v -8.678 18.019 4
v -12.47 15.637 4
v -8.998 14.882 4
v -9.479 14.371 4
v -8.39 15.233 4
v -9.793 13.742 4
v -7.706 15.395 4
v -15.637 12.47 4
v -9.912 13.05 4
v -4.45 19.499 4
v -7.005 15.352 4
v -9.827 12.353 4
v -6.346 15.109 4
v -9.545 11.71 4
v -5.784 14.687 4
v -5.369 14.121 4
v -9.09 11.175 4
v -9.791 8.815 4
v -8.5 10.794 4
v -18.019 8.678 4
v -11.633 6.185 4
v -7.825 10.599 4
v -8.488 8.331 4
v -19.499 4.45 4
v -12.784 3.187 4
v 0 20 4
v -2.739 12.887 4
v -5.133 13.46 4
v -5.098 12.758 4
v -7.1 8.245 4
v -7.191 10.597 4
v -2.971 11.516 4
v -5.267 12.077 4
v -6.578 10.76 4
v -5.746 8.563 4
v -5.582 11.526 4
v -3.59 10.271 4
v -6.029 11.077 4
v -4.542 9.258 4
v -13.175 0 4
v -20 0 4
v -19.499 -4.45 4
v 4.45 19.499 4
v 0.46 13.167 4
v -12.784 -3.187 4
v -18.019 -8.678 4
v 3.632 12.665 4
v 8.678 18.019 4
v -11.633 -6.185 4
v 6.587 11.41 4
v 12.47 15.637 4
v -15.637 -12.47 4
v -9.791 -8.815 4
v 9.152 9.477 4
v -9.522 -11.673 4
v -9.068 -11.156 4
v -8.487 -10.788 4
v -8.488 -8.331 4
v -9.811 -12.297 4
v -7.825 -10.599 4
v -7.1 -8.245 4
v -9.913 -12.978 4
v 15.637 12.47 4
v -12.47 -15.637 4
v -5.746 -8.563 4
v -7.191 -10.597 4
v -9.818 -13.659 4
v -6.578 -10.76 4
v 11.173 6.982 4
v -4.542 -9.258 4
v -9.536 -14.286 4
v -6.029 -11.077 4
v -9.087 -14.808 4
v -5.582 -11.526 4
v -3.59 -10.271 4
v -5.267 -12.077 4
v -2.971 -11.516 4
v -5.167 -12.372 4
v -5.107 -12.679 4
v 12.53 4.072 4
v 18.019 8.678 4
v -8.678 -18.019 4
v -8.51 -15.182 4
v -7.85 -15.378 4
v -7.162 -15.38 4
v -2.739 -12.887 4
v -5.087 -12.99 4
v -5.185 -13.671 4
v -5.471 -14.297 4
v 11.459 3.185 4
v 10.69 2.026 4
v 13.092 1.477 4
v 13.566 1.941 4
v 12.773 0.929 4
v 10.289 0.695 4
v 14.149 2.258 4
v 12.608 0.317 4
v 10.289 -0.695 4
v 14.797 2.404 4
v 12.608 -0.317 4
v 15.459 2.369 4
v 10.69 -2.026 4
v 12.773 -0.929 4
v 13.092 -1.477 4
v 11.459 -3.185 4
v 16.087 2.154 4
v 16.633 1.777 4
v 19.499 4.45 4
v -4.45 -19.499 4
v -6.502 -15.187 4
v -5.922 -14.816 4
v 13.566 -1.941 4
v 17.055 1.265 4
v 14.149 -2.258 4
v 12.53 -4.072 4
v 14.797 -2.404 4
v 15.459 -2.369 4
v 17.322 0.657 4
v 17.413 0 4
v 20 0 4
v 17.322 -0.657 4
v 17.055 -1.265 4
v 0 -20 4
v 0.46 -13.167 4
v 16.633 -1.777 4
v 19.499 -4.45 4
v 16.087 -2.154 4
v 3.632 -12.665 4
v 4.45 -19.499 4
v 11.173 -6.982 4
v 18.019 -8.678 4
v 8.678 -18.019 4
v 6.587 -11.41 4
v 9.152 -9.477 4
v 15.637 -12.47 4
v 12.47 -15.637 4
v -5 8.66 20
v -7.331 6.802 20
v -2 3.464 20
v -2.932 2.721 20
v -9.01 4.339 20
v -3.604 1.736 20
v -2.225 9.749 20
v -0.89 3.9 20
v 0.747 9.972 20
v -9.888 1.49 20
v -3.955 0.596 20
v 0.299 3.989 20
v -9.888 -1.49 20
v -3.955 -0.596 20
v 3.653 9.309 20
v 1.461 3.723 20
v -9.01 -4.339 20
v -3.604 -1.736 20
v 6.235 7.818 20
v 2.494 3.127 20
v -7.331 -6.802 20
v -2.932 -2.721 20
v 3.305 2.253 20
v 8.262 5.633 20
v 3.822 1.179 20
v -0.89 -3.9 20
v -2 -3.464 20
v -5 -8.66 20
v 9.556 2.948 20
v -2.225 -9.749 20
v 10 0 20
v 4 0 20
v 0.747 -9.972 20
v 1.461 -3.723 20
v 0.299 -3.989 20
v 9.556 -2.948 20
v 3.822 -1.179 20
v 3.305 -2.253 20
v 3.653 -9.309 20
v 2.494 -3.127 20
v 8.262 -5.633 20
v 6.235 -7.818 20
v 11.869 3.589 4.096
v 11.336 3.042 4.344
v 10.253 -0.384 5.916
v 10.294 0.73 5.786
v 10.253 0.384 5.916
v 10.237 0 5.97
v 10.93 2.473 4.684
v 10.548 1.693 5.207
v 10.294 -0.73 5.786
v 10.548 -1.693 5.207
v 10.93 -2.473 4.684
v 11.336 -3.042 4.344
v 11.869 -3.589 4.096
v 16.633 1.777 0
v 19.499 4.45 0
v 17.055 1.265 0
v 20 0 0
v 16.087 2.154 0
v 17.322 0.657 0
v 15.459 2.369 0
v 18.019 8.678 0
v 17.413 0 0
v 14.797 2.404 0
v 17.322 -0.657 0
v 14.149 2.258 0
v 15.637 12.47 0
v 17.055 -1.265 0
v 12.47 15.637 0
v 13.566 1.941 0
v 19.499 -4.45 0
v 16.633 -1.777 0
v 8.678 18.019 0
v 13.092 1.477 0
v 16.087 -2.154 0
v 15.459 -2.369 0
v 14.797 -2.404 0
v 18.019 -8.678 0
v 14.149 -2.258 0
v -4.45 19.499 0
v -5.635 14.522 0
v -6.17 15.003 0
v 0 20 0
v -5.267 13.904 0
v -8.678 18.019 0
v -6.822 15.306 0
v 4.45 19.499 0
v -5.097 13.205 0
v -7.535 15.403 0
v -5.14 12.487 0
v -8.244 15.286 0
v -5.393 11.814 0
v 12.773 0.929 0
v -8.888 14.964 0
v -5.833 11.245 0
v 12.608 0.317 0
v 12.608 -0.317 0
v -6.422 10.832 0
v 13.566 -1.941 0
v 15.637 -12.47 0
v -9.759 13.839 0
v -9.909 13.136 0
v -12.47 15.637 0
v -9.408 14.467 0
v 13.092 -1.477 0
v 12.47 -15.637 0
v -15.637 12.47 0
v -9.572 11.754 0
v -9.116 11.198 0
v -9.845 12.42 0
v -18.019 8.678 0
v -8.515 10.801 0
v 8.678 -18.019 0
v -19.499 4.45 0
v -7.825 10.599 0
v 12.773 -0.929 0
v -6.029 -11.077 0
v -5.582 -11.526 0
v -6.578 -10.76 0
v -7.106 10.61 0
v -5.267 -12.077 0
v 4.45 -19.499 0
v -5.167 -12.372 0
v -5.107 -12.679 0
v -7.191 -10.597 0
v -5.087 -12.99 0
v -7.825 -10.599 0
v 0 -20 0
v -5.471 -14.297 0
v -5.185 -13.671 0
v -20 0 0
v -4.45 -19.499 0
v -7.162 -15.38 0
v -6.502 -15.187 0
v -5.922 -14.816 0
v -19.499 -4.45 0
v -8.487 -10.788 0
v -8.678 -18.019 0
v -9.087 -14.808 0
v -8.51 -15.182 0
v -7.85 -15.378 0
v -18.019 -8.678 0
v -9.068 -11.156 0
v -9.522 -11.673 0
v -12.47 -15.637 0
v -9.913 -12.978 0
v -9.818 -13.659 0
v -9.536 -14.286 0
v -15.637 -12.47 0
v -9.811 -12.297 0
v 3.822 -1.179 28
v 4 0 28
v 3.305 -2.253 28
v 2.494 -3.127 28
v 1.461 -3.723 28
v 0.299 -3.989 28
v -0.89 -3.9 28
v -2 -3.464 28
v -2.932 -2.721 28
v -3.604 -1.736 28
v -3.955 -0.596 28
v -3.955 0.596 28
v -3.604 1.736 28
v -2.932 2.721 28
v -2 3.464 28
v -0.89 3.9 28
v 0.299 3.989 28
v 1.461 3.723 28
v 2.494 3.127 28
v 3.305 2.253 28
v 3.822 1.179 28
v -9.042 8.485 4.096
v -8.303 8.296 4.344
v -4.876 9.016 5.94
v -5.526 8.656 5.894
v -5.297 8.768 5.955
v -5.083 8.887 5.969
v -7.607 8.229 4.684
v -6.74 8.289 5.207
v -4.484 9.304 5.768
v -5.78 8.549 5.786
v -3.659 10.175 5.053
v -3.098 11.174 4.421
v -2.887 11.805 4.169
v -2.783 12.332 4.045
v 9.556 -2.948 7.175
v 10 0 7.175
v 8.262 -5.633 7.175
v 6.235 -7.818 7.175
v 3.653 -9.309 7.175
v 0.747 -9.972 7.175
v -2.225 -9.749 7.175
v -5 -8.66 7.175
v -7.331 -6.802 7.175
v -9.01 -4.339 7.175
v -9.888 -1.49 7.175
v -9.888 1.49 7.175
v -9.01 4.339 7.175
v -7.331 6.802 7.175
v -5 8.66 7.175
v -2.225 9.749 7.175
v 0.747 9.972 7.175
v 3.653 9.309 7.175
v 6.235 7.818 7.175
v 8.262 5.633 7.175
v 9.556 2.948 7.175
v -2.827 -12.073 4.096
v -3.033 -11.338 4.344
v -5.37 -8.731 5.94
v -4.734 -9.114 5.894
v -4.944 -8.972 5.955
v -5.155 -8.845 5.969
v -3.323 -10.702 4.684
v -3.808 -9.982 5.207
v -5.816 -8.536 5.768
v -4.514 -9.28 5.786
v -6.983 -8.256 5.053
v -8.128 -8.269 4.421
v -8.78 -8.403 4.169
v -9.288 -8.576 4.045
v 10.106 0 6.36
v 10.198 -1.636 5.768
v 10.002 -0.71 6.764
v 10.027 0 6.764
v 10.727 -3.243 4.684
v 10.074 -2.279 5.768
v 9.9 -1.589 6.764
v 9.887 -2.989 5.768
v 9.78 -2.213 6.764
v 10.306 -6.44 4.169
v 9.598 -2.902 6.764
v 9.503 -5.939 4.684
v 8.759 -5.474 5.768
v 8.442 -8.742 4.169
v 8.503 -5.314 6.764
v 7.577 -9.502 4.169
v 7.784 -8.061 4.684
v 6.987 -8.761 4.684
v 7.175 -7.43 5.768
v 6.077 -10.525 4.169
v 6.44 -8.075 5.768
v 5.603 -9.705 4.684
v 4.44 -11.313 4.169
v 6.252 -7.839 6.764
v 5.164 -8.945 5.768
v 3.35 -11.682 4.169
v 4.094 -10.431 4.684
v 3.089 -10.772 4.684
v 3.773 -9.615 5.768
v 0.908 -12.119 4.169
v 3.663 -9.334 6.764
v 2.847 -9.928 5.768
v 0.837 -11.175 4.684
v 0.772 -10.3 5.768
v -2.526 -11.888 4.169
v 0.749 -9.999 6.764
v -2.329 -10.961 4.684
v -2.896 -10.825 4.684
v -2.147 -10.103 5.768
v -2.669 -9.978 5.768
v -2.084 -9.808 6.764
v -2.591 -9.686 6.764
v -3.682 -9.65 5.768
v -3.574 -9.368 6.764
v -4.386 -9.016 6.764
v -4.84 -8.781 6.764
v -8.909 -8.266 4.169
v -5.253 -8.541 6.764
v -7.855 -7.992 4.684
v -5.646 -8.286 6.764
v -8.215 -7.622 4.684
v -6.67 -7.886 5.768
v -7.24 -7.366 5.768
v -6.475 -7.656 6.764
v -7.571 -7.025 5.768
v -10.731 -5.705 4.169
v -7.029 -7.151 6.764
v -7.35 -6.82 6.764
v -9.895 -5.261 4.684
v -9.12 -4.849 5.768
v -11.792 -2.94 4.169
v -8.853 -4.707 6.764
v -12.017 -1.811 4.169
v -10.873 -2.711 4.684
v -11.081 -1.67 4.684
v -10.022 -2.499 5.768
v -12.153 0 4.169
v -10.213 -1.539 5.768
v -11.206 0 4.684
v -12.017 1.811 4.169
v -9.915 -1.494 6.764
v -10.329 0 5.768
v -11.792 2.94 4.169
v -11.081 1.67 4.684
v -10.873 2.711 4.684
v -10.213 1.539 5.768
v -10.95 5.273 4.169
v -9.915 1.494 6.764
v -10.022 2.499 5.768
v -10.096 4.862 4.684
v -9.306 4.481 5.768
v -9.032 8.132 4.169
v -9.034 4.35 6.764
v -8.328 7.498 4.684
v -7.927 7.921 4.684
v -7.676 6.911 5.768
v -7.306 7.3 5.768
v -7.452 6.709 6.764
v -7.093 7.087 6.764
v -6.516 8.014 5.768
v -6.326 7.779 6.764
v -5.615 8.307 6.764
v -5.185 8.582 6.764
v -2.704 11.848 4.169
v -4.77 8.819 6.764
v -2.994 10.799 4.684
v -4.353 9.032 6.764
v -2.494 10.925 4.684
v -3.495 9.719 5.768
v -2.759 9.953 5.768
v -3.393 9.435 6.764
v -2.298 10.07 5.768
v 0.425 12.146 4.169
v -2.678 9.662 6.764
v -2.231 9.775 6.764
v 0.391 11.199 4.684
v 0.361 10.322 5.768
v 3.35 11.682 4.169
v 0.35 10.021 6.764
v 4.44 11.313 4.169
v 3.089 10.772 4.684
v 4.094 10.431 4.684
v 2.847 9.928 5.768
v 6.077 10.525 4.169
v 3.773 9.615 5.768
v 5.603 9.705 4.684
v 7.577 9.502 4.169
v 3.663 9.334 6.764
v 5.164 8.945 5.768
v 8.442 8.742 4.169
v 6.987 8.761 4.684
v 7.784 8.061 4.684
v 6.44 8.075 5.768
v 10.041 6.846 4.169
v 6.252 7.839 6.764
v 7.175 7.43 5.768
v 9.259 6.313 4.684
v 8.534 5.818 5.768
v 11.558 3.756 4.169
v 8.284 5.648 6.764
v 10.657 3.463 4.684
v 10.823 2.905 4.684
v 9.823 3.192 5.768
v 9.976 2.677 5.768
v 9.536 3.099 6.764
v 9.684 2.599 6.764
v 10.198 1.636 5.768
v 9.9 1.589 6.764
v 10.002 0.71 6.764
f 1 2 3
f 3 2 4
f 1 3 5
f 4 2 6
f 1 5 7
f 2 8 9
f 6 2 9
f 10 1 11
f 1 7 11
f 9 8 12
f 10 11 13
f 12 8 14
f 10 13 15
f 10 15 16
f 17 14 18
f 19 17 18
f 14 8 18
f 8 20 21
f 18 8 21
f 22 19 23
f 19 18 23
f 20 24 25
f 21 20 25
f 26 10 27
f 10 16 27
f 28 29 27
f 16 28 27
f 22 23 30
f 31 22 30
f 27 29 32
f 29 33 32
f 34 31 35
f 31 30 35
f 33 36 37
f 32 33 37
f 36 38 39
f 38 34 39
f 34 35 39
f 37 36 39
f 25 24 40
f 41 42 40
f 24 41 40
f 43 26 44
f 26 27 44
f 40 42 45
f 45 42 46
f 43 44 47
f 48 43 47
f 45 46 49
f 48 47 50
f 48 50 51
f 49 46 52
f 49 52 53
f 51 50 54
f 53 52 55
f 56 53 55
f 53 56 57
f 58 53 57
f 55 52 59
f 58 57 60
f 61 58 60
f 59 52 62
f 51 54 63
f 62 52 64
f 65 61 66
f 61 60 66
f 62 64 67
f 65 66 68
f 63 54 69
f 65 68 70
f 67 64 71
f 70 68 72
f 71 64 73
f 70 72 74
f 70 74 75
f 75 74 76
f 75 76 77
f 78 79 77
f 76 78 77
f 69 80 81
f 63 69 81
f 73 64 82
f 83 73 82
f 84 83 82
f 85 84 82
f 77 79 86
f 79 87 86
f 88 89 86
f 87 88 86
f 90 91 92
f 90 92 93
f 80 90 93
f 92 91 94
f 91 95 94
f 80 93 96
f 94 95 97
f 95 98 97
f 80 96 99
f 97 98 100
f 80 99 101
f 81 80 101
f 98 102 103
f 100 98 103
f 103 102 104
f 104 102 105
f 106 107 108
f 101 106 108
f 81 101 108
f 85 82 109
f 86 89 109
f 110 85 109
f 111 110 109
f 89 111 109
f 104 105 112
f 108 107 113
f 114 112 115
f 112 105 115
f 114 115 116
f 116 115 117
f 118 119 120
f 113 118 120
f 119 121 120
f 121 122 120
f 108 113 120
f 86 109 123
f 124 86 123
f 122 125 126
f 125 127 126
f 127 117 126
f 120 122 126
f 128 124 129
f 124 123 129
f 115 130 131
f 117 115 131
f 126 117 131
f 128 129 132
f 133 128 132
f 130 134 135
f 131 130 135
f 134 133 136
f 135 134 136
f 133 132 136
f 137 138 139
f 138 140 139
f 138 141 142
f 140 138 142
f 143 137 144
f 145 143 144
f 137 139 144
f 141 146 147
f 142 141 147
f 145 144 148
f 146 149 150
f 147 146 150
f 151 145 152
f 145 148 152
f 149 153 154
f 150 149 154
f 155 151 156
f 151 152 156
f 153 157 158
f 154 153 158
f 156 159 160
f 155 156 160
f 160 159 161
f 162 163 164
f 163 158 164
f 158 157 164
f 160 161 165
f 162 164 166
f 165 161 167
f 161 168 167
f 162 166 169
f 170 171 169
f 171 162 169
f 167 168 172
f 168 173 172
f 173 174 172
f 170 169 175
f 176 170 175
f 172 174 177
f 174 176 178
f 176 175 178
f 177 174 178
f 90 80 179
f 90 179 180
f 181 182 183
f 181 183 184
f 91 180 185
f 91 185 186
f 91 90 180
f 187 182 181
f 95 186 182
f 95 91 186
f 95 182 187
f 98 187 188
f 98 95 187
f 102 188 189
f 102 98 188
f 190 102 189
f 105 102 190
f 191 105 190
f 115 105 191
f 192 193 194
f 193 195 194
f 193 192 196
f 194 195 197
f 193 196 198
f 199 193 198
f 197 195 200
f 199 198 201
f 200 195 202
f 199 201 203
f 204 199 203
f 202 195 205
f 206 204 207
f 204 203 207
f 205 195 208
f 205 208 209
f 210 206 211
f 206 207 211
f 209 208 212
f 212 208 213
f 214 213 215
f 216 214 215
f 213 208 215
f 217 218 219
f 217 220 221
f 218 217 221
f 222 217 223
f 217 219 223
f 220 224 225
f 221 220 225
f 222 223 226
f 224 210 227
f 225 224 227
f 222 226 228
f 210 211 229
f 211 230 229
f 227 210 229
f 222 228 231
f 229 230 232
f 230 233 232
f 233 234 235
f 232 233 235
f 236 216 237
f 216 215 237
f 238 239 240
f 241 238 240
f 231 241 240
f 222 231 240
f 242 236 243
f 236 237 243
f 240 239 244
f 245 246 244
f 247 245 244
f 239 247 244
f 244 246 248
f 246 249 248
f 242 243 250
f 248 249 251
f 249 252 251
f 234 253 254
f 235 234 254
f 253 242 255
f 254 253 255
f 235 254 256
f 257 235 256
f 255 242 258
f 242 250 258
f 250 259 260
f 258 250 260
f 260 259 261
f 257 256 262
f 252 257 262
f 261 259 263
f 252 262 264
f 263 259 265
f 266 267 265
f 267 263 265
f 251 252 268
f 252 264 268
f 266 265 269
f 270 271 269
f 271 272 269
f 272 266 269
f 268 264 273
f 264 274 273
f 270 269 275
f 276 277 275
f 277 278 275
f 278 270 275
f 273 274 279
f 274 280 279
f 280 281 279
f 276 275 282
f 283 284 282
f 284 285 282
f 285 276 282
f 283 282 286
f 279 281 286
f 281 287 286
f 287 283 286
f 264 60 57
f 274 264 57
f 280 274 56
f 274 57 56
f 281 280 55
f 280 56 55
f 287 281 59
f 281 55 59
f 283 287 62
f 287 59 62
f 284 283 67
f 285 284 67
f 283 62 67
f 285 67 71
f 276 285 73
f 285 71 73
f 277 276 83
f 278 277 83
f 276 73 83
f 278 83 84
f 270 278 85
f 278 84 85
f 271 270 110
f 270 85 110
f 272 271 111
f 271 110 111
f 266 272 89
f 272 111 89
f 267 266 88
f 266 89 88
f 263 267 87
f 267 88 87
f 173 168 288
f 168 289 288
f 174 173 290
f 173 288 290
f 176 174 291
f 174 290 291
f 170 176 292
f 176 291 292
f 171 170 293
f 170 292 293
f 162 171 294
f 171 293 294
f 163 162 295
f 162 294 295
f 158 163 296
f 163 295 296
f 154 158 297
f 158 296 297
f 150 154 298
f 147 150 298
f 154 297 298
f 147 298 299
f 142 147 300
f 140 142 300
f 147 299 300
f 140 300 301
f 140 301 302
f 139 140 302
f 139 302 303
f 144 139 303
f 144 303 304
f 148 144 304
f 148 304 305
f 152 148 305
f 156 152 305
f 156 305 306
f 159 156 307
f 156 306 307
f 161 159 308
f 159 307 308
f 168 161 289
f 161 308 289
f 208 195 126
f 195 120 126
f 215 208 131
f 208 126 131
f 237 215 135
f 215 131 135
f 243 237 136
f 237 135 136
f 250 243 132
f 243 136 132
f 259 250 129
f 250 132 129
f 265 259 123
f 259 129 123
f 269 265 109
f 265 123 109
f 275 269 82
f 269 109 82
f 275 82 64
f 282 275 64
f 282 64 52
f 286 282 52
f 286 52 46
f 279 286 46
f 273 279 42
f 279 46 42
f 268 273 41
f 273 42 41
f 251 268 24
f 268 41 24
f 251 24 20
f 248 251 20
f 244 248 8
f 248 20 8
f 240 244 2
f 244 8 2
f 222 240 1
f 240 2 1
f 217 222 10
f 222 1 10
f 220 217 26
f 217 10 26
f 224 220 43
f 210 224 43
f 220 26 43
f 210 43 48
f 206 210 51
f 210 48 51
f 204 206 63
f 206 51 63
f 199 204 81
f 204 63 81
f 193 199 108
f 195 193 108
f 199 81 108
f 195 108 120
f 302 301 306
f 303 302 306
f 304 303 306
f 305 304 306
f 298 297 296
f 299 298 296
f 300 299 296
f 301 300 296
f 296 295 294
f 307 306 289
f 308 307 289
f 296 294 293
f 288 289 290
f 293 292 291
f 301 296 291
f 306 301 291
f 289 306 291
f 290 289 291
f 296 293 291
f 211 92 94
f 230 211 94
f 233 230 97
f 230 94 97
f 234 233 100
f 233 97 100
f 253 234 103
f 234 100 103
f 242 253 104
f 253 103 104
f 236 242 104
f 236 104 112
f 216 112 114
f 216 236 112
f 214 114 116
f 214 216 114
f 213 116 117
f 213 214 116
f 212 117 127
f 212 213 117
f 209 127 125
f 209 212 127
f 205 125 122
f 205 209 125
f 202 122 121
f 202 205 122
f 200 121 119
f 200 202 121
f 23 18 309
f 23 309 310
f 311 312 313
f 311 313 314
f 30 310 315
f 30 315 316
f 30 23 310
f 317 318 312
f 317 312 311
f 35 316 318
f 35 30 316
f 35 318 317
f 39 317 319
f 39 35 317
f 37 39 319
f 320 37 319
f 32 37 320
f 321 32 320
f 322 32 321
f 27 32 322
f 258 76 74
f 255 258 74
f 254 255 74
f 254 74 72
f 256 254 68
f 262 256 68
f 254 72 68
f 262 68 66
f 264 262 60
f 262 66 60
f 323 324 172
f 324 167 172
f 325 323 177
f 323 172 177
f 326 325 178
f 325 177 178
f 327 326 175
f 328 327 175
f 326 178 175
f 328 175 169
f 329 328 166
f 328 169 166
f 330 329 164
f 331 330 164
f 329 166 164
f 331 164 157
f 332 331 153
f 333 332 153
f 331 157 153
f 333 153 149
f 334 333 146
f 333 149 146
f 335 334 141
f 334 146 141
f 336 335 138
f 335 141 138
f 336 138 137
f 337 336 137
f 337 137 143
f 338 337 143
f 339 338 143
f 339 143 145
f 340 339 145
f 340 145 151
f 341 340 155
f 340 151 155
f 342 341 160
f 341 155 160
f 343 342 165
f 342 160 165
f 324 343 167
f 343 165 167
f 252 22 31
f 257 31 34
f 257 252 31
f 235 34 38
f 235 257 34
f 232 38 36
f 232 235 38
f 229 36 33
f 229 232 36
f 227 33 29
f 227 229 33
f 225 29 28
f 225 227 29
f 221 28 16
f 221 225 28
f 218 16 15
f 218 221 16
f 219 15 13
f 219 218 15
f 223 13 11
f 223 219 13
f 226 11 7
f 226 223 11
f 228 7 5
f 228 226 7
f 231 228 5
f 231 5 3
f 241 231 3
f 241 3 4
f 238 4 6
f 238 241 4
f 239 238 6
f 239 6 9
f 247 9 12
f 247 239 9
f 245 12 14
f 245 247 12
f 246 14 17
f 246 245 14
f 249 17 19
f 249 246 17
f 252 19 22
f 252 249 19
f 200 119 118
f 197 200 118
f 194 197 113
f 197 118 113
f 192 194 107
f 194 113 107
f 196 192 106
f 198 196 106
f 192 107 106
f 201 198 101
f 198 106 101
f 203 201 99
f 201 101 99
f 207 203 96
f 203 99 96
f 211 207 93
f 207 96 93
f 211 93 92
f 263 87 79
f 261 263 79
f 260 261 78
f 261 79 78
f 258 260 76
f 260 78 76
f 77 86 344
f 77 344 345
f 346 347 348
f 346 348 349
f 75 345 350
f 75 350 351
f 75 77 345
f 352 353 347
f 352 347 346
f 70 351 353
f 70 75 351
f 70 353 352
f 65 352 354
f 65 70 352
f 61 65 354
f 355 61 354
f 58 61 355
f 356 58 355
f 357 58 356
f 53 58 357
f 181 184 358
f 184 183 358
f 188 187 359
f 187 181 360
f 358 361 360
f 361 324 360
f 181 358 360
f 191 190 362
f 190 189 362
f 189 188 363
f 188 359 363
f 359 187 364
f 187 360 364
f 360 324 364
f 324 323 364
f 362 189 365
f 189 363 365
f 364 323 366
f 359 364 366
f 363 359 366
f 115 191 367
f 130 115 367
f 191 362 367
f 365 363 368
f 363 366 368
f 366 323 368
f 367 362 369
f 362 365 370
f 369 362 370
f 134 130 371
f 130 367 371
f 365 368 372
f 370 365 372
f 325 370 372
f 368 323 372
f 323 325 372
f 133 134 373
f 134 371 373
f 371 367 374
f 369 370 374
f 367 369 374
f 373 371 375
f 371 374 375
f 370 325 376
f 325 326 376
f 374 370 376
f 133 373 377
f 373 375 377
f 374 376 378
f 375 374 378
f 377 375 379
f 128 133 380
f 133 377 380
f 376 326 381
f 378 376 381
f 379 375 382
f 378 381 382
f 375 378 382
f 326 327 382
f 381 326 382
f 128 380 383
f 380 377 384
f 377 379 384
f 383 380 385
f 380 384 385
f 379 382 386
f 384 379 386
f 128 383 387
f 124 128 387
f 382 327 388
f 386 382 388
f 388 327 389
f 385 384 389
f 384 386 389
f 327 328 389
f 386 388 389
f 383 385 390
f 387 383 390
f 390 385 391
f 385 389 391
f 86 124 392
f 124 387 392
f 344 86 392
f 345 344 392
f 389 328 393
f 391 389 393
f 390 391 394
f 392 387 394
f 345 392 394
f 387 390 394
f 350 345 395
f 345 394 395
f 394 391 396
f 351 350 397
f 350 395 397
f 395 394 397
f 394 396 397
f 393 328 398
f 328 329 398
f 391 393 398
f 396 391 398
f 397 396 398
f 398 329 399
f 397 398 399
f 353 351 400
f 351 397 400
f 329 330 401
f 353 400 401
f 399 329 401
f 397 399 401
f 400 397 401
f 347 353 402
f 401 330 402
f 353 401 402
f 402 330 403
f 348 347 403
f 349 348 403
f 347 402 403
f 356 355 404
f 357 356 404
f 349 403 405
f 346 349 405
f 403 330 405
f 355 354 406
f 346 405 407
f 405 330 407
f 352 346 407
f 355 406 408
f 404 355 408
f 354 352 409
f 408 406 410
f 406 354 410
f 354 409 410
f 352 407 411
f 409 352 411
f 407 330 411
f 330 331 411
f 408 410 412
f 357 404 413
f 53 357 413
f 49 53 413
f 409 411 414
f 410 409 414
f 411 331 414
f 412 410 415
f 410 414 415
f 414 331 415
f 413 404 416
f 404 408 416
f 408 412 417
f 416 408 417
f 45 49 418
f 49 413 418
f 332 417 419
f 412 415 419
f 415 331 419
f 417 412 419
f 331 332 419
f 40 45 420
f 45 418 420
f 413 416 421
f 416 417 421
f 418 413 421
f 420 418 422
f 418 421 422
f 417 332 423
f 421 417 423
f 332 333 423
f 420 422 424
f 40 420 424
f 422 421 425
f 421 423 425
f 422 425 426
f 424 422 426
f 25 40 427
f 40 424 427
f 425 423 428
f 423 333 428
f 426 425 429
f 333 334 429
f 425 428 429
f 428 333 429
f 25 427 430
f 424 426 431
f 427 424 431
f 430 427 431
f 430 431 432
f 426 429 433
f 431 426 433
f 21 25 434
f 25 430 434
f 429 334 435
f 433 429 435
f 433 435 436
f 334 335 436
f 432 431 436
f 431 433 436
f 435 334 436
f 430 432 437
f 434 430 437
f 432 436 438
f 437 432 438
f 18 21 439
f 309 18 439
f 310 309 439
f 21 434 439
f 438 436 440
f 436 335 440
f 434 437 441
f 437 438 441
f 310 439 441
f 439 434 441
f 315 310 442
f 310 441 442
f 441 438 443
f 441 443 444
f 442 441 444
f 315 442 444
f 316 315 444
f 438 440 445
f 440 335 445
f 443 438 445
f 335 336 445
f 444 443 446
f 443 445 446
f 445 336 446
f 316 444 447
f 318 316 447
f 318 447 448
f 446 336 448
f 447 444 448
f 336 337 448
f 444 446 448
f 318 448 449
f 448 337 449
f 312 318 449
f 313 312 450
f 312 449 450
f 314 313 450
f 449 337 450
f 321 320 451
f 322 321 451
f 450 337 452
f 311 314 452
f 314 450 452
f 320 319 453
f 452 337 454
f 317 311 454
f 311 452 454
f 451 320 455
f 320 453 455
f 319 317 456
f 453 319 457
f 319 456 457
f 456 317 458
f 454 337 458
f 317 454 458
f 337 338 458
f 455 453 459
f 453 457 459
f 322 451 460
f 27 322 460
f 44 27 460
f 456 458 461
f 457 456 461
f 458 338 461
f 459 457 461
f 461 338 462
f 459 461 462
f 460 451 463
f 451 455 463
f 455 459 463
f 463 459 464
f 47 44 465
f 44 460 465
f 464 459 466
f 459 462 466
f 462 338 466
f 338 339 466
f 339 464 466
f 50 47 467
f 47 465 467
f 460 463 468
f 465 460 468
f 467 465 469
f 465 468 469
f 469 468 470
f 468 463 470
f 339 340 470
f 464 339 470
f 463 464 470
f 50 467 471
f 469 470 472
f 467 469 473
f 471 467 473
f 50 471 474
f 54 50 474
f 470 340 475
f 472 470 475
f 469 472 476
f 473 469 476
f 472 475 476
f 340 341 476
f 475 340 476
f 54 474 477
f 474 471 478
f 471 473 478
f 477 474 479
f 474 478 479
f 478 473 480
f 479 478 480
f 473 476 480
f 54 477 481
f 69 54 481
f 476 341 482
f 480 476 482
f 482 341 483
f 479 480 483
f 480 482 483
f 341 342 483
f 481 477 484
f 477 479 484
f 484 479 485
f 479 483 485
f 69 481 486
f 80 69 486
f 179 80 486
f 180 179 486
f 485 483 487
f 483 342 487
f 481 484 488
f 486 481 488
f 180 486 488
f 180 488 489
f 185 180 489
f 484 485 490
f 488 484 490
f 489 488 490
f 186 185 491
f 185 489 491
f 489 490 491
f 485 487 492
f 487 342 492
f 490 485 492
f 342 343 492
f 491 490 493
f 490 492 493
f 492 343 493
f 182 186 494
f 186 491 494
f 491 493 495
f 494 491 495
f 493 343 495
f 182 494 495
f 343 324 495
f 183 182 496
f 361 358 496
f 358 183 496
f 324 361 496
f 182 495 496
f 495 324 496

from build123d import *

# Parameters (mm, degrees)
F3_DEPTH = 12.7
F4_DEPTH = 24.001


with BuildPart() as f1:
    # F0 (on Front) → F1 (revolve)
    with BuildSketch(Plane.XZ):
        with BuildLine():
            Line((0, 28), (0, 0))
            Line((0, 0), (20, 0))
            Line((20, 0), (20, 4))
            Line((20, 4), (13.175, 4))
            ThreePointArc((13.175, 4), (10.9299359697, 4.9299359697), (10, 7.175))
            Line((10, 7.175), (10, 20))
            Line((10, 20), (4, 20))
            Line((4, 20), (4, 28))
            Line((4, 28), (0, 28))
        make_face()
    revolve(axis=Axis((0, 0, 14), (0, 0, -1)))

    # F2 (on face) → F3 (cut, symmetric)
    with BuildSketch(Plane.XY.offset(4)):
        with BuildLine():
            ThreePointArc((-7.8251834884, 10.5993928304), (-6.2935, 10.9006617574), (-5.2667517116, 12.0765041054))
            ThreePointArc((-5.2667517116, 12.0765041054), (-6.5875, 11.4098846949), (-7.8251834884, 10.5993928304))
        make_face()
        with BuildLine():
            ThreePointArc((-7.8251834884, 10.5993928304), (-6.5875, 11.4098846949), (-5.2667517116, 12.0765041054))
            ThreePointArc((-5.2667517116, 12.0765041054), (-5.1323643524, 12.5246875524), (-5.087, 12.9903810568))
            ThreePointArc((-5.087, 12.9903810568), (-9.087120229, 14.8079669224), (-7.8251834884, 10.5993928304))
        make_face()
        with BuildLine():
            ThreePointArc((13.0919352, -1.4771112751), (15.7805154187, -2.2832793699), (17.413, 0))
            ThreePointArc((17.413, 0), (15.7805154187, 2.2832793699), (13.0919352, 1.4771112751))
            ThreePointArc((13.0919352, 1.4771112751), (13.1542174085, 0.7397224953), (13.175, 0))
            ThreePointArc((13.175, 0), (13.1542174085, -0.7397224953), (13.0919352, -1.4771112751))
        make_face()
        with BuildLine():
            ThreePointArc((13.175, 0), (13.1542174085, 0.7397224953), (13.0919352, 1.4771112751))
            ThreePointArc((13.0919352, 1.4771112751), (12.587, 0), (13.0919352, -1.4771112751))
            ThreePointArc((13.0919352, -1.4771112751), (13.1542174085, -0.7397224953), (13.175, 0))
        make_face()
        with BuildLine():
            ThreePointArc((-7.8251834884, -10.5993928304), (-6.5875, -11.4098846949), (-5.2667517116, -12.0765041054))
            ThreePointArc((-5.2667517116, -12.0765041054), (-6.2935, -10.9006617574), (-7.8251834884, -10.5993928304))
        make_face()
        with BuildLine():
            ThreePointArc((-5.087, -12.9903810568), (-5.1323643524, -12.5246875524), (-5.2667517116, -12.0765041054))
            ThreePointArc((-5.2667517116, -12.0765041054), (-6.5875, -11.4098846949), (-7.8251834884, -10.5993928304))
            ThreePointArc((-7.8251834884, -10.5993928304), (-9.087120229, -14.8079669224), (-5.087, -12.9903810568))
        make_face()
    extrude(amount=F3_DEPTH, both=True, mode=Mode.SUBTRACT)

    # F2 (on face) → F4 (cut, through all)
    with BuildSketch(Plane.XY.offset(4)):
        with BuildLine():
            ThreePointArc((-5.2667517116, 12.0765041054), (-4.0231580631, 12.545709394), (-2.7386172875, 12.8872262474))
            ThreePointArc((-2.7386172875, 12.8872262474), (-2.7377793301, 12.9388006268), (-2.7375, 12.9903810568))
            ThreePointArc((-2.7375, 12.9903810568), (-9.9257802977, 17.0887949204), (-9.7913566709, 8.8153252659))
            ThreePointArc((-9.7913566709, 8.8153252659), (-8.8533240122, 9.7570117831), (-7.8251834884, 10.5993928304))
            ThreePointArc((-7.8251834884, 10.5993928304), (-9.087120229, 14.8079669224), (-5.087, 12.9903810568))
            ThreePointArc((-5.087, 12.9903810568), (-5.1323643524, 12.5246875524), (-5.2667517116, 12.0765041054))
        make_face()
        with BuildLine():
            ThreePointArc((-9.7913566709, 8.8153252659), (-5.11875, 8.8659350712), (-2.7386172875, 12.8872262474))
            ThreePointArc((-2.7386172875, 12.8872262474), (-4.0231580631, 12.545709394), (-5.2667517116, 12.0765041054))
            ThreePointArc((-5.2667517116, 12.0765041054), (-6.2935, 10.9006617574), (-7.8251834884, 10.5993928304))
            ThreePointArc((-7.8251834884, 10.5993928304), (-8.8533240122, 9.7570117831), (-9.7913566709, 8.8153252659))
        make_face()
        with BuildLine():
            ThreePointArc((13.0919352, -1.4771112751), (12.587, 0), (13.0919352, 1.4771112751))
            ThreePointArc((13.0919352, 1.4771112751), (12.8764820753, 2.788697611), (12.5299739583, 4.0719009815))
            ThreePointArc((12.5299739583, 4.0719009815), (10.2375, 0), (12.5299739583, -4.0719009815))
            ThreePointArc((12.5299739583, -4.0719009815), (12.8764820753, -2.788697611), (13.0919352, -1.4771112751))
        make_face()
        with BuildLine():
            ThreePointArc((13.0919352, 1.4771112751), (15.7805154187, 2.2832793699), (17.413, 0))
            ThreePointArc((17.413, 0), (15.7805154187, -2.2832793699), (13.0919352, -1.4771112751))
            ThreePointArc((13.0919352, -1.4771112751), (12.8764820753, -2.788697611), (12.5299739583, -4.0719009815))
            ThreePointArc((12.5299739583, -4.0719009815), (17.3364403723, -4.1499942936), (19.7625, 0))
            ThreePointArc((19.7625, 0), (17.3364403723, 4.1499942936), (12.5299739583, 4.0719009815))
            ThreePointArc((12.5299739583, 4.0719009815), (12.8764820753, 2.788697611), (13.0919352, 1.4771112751))
        make_face()
        with BuildLine():
            ThreePointArc((-5.2667517116, -12.0765041054), (-4.0231580631, -12.545709394), (-2.7386172875, -12.8872262474))
            ThreePointArc((-2.7386172875, -12.8872262474), (-5.11875, -8.8659350712), (-9.7913566709, -8.8153252659))
            ThreePointArc((-9.7913566709, -8.8153252659), (-8.8533240122, -9.7570117831), (-7.8251834884, -10.5993928304))
            ThreePointArc((-7.8251834884, -10.5993928304), (-6.2935, -10.9006617574), (-5.2667517116, -12.0765041054))
        make_face()
        with BuildLine():
            ThreePointArc((-2.7375, -12.9903810568), (-2.7377793301, -12.9388006268), (-2.7386172875, -12.8872262474))
            ThreePointArc((-2.7386172875, -12.8872262474), (-4.0231580631, -12.545709394), (-5.2667517116, -12.0765041054))
            ThreePointArc((-5.2667517116, -12.0765041054), (-5.1323643524, -12.5246875524), (-5.087, -12.9903810568))
            ThreePointArc((-5.087, -12.9903810568), (-9.087120229, -14.8079669224), (-7.8251834884, -10.5993928304))
            ThreePointArc((-7.8251834884, -10.5993928304), (-8.8533240122, -9.7570117831), (-9.7913566709, -8.8153252659))
            ThreePointArc((-9.7913566709, -8.8153252659), (-9.9257802977, -17.0887949204), (-2.7375, -12.9903810568))
        make_face()
    extrude(amount=F4_DEPTH, mode=Mode.SUBTRACT)


solid = f1.part
